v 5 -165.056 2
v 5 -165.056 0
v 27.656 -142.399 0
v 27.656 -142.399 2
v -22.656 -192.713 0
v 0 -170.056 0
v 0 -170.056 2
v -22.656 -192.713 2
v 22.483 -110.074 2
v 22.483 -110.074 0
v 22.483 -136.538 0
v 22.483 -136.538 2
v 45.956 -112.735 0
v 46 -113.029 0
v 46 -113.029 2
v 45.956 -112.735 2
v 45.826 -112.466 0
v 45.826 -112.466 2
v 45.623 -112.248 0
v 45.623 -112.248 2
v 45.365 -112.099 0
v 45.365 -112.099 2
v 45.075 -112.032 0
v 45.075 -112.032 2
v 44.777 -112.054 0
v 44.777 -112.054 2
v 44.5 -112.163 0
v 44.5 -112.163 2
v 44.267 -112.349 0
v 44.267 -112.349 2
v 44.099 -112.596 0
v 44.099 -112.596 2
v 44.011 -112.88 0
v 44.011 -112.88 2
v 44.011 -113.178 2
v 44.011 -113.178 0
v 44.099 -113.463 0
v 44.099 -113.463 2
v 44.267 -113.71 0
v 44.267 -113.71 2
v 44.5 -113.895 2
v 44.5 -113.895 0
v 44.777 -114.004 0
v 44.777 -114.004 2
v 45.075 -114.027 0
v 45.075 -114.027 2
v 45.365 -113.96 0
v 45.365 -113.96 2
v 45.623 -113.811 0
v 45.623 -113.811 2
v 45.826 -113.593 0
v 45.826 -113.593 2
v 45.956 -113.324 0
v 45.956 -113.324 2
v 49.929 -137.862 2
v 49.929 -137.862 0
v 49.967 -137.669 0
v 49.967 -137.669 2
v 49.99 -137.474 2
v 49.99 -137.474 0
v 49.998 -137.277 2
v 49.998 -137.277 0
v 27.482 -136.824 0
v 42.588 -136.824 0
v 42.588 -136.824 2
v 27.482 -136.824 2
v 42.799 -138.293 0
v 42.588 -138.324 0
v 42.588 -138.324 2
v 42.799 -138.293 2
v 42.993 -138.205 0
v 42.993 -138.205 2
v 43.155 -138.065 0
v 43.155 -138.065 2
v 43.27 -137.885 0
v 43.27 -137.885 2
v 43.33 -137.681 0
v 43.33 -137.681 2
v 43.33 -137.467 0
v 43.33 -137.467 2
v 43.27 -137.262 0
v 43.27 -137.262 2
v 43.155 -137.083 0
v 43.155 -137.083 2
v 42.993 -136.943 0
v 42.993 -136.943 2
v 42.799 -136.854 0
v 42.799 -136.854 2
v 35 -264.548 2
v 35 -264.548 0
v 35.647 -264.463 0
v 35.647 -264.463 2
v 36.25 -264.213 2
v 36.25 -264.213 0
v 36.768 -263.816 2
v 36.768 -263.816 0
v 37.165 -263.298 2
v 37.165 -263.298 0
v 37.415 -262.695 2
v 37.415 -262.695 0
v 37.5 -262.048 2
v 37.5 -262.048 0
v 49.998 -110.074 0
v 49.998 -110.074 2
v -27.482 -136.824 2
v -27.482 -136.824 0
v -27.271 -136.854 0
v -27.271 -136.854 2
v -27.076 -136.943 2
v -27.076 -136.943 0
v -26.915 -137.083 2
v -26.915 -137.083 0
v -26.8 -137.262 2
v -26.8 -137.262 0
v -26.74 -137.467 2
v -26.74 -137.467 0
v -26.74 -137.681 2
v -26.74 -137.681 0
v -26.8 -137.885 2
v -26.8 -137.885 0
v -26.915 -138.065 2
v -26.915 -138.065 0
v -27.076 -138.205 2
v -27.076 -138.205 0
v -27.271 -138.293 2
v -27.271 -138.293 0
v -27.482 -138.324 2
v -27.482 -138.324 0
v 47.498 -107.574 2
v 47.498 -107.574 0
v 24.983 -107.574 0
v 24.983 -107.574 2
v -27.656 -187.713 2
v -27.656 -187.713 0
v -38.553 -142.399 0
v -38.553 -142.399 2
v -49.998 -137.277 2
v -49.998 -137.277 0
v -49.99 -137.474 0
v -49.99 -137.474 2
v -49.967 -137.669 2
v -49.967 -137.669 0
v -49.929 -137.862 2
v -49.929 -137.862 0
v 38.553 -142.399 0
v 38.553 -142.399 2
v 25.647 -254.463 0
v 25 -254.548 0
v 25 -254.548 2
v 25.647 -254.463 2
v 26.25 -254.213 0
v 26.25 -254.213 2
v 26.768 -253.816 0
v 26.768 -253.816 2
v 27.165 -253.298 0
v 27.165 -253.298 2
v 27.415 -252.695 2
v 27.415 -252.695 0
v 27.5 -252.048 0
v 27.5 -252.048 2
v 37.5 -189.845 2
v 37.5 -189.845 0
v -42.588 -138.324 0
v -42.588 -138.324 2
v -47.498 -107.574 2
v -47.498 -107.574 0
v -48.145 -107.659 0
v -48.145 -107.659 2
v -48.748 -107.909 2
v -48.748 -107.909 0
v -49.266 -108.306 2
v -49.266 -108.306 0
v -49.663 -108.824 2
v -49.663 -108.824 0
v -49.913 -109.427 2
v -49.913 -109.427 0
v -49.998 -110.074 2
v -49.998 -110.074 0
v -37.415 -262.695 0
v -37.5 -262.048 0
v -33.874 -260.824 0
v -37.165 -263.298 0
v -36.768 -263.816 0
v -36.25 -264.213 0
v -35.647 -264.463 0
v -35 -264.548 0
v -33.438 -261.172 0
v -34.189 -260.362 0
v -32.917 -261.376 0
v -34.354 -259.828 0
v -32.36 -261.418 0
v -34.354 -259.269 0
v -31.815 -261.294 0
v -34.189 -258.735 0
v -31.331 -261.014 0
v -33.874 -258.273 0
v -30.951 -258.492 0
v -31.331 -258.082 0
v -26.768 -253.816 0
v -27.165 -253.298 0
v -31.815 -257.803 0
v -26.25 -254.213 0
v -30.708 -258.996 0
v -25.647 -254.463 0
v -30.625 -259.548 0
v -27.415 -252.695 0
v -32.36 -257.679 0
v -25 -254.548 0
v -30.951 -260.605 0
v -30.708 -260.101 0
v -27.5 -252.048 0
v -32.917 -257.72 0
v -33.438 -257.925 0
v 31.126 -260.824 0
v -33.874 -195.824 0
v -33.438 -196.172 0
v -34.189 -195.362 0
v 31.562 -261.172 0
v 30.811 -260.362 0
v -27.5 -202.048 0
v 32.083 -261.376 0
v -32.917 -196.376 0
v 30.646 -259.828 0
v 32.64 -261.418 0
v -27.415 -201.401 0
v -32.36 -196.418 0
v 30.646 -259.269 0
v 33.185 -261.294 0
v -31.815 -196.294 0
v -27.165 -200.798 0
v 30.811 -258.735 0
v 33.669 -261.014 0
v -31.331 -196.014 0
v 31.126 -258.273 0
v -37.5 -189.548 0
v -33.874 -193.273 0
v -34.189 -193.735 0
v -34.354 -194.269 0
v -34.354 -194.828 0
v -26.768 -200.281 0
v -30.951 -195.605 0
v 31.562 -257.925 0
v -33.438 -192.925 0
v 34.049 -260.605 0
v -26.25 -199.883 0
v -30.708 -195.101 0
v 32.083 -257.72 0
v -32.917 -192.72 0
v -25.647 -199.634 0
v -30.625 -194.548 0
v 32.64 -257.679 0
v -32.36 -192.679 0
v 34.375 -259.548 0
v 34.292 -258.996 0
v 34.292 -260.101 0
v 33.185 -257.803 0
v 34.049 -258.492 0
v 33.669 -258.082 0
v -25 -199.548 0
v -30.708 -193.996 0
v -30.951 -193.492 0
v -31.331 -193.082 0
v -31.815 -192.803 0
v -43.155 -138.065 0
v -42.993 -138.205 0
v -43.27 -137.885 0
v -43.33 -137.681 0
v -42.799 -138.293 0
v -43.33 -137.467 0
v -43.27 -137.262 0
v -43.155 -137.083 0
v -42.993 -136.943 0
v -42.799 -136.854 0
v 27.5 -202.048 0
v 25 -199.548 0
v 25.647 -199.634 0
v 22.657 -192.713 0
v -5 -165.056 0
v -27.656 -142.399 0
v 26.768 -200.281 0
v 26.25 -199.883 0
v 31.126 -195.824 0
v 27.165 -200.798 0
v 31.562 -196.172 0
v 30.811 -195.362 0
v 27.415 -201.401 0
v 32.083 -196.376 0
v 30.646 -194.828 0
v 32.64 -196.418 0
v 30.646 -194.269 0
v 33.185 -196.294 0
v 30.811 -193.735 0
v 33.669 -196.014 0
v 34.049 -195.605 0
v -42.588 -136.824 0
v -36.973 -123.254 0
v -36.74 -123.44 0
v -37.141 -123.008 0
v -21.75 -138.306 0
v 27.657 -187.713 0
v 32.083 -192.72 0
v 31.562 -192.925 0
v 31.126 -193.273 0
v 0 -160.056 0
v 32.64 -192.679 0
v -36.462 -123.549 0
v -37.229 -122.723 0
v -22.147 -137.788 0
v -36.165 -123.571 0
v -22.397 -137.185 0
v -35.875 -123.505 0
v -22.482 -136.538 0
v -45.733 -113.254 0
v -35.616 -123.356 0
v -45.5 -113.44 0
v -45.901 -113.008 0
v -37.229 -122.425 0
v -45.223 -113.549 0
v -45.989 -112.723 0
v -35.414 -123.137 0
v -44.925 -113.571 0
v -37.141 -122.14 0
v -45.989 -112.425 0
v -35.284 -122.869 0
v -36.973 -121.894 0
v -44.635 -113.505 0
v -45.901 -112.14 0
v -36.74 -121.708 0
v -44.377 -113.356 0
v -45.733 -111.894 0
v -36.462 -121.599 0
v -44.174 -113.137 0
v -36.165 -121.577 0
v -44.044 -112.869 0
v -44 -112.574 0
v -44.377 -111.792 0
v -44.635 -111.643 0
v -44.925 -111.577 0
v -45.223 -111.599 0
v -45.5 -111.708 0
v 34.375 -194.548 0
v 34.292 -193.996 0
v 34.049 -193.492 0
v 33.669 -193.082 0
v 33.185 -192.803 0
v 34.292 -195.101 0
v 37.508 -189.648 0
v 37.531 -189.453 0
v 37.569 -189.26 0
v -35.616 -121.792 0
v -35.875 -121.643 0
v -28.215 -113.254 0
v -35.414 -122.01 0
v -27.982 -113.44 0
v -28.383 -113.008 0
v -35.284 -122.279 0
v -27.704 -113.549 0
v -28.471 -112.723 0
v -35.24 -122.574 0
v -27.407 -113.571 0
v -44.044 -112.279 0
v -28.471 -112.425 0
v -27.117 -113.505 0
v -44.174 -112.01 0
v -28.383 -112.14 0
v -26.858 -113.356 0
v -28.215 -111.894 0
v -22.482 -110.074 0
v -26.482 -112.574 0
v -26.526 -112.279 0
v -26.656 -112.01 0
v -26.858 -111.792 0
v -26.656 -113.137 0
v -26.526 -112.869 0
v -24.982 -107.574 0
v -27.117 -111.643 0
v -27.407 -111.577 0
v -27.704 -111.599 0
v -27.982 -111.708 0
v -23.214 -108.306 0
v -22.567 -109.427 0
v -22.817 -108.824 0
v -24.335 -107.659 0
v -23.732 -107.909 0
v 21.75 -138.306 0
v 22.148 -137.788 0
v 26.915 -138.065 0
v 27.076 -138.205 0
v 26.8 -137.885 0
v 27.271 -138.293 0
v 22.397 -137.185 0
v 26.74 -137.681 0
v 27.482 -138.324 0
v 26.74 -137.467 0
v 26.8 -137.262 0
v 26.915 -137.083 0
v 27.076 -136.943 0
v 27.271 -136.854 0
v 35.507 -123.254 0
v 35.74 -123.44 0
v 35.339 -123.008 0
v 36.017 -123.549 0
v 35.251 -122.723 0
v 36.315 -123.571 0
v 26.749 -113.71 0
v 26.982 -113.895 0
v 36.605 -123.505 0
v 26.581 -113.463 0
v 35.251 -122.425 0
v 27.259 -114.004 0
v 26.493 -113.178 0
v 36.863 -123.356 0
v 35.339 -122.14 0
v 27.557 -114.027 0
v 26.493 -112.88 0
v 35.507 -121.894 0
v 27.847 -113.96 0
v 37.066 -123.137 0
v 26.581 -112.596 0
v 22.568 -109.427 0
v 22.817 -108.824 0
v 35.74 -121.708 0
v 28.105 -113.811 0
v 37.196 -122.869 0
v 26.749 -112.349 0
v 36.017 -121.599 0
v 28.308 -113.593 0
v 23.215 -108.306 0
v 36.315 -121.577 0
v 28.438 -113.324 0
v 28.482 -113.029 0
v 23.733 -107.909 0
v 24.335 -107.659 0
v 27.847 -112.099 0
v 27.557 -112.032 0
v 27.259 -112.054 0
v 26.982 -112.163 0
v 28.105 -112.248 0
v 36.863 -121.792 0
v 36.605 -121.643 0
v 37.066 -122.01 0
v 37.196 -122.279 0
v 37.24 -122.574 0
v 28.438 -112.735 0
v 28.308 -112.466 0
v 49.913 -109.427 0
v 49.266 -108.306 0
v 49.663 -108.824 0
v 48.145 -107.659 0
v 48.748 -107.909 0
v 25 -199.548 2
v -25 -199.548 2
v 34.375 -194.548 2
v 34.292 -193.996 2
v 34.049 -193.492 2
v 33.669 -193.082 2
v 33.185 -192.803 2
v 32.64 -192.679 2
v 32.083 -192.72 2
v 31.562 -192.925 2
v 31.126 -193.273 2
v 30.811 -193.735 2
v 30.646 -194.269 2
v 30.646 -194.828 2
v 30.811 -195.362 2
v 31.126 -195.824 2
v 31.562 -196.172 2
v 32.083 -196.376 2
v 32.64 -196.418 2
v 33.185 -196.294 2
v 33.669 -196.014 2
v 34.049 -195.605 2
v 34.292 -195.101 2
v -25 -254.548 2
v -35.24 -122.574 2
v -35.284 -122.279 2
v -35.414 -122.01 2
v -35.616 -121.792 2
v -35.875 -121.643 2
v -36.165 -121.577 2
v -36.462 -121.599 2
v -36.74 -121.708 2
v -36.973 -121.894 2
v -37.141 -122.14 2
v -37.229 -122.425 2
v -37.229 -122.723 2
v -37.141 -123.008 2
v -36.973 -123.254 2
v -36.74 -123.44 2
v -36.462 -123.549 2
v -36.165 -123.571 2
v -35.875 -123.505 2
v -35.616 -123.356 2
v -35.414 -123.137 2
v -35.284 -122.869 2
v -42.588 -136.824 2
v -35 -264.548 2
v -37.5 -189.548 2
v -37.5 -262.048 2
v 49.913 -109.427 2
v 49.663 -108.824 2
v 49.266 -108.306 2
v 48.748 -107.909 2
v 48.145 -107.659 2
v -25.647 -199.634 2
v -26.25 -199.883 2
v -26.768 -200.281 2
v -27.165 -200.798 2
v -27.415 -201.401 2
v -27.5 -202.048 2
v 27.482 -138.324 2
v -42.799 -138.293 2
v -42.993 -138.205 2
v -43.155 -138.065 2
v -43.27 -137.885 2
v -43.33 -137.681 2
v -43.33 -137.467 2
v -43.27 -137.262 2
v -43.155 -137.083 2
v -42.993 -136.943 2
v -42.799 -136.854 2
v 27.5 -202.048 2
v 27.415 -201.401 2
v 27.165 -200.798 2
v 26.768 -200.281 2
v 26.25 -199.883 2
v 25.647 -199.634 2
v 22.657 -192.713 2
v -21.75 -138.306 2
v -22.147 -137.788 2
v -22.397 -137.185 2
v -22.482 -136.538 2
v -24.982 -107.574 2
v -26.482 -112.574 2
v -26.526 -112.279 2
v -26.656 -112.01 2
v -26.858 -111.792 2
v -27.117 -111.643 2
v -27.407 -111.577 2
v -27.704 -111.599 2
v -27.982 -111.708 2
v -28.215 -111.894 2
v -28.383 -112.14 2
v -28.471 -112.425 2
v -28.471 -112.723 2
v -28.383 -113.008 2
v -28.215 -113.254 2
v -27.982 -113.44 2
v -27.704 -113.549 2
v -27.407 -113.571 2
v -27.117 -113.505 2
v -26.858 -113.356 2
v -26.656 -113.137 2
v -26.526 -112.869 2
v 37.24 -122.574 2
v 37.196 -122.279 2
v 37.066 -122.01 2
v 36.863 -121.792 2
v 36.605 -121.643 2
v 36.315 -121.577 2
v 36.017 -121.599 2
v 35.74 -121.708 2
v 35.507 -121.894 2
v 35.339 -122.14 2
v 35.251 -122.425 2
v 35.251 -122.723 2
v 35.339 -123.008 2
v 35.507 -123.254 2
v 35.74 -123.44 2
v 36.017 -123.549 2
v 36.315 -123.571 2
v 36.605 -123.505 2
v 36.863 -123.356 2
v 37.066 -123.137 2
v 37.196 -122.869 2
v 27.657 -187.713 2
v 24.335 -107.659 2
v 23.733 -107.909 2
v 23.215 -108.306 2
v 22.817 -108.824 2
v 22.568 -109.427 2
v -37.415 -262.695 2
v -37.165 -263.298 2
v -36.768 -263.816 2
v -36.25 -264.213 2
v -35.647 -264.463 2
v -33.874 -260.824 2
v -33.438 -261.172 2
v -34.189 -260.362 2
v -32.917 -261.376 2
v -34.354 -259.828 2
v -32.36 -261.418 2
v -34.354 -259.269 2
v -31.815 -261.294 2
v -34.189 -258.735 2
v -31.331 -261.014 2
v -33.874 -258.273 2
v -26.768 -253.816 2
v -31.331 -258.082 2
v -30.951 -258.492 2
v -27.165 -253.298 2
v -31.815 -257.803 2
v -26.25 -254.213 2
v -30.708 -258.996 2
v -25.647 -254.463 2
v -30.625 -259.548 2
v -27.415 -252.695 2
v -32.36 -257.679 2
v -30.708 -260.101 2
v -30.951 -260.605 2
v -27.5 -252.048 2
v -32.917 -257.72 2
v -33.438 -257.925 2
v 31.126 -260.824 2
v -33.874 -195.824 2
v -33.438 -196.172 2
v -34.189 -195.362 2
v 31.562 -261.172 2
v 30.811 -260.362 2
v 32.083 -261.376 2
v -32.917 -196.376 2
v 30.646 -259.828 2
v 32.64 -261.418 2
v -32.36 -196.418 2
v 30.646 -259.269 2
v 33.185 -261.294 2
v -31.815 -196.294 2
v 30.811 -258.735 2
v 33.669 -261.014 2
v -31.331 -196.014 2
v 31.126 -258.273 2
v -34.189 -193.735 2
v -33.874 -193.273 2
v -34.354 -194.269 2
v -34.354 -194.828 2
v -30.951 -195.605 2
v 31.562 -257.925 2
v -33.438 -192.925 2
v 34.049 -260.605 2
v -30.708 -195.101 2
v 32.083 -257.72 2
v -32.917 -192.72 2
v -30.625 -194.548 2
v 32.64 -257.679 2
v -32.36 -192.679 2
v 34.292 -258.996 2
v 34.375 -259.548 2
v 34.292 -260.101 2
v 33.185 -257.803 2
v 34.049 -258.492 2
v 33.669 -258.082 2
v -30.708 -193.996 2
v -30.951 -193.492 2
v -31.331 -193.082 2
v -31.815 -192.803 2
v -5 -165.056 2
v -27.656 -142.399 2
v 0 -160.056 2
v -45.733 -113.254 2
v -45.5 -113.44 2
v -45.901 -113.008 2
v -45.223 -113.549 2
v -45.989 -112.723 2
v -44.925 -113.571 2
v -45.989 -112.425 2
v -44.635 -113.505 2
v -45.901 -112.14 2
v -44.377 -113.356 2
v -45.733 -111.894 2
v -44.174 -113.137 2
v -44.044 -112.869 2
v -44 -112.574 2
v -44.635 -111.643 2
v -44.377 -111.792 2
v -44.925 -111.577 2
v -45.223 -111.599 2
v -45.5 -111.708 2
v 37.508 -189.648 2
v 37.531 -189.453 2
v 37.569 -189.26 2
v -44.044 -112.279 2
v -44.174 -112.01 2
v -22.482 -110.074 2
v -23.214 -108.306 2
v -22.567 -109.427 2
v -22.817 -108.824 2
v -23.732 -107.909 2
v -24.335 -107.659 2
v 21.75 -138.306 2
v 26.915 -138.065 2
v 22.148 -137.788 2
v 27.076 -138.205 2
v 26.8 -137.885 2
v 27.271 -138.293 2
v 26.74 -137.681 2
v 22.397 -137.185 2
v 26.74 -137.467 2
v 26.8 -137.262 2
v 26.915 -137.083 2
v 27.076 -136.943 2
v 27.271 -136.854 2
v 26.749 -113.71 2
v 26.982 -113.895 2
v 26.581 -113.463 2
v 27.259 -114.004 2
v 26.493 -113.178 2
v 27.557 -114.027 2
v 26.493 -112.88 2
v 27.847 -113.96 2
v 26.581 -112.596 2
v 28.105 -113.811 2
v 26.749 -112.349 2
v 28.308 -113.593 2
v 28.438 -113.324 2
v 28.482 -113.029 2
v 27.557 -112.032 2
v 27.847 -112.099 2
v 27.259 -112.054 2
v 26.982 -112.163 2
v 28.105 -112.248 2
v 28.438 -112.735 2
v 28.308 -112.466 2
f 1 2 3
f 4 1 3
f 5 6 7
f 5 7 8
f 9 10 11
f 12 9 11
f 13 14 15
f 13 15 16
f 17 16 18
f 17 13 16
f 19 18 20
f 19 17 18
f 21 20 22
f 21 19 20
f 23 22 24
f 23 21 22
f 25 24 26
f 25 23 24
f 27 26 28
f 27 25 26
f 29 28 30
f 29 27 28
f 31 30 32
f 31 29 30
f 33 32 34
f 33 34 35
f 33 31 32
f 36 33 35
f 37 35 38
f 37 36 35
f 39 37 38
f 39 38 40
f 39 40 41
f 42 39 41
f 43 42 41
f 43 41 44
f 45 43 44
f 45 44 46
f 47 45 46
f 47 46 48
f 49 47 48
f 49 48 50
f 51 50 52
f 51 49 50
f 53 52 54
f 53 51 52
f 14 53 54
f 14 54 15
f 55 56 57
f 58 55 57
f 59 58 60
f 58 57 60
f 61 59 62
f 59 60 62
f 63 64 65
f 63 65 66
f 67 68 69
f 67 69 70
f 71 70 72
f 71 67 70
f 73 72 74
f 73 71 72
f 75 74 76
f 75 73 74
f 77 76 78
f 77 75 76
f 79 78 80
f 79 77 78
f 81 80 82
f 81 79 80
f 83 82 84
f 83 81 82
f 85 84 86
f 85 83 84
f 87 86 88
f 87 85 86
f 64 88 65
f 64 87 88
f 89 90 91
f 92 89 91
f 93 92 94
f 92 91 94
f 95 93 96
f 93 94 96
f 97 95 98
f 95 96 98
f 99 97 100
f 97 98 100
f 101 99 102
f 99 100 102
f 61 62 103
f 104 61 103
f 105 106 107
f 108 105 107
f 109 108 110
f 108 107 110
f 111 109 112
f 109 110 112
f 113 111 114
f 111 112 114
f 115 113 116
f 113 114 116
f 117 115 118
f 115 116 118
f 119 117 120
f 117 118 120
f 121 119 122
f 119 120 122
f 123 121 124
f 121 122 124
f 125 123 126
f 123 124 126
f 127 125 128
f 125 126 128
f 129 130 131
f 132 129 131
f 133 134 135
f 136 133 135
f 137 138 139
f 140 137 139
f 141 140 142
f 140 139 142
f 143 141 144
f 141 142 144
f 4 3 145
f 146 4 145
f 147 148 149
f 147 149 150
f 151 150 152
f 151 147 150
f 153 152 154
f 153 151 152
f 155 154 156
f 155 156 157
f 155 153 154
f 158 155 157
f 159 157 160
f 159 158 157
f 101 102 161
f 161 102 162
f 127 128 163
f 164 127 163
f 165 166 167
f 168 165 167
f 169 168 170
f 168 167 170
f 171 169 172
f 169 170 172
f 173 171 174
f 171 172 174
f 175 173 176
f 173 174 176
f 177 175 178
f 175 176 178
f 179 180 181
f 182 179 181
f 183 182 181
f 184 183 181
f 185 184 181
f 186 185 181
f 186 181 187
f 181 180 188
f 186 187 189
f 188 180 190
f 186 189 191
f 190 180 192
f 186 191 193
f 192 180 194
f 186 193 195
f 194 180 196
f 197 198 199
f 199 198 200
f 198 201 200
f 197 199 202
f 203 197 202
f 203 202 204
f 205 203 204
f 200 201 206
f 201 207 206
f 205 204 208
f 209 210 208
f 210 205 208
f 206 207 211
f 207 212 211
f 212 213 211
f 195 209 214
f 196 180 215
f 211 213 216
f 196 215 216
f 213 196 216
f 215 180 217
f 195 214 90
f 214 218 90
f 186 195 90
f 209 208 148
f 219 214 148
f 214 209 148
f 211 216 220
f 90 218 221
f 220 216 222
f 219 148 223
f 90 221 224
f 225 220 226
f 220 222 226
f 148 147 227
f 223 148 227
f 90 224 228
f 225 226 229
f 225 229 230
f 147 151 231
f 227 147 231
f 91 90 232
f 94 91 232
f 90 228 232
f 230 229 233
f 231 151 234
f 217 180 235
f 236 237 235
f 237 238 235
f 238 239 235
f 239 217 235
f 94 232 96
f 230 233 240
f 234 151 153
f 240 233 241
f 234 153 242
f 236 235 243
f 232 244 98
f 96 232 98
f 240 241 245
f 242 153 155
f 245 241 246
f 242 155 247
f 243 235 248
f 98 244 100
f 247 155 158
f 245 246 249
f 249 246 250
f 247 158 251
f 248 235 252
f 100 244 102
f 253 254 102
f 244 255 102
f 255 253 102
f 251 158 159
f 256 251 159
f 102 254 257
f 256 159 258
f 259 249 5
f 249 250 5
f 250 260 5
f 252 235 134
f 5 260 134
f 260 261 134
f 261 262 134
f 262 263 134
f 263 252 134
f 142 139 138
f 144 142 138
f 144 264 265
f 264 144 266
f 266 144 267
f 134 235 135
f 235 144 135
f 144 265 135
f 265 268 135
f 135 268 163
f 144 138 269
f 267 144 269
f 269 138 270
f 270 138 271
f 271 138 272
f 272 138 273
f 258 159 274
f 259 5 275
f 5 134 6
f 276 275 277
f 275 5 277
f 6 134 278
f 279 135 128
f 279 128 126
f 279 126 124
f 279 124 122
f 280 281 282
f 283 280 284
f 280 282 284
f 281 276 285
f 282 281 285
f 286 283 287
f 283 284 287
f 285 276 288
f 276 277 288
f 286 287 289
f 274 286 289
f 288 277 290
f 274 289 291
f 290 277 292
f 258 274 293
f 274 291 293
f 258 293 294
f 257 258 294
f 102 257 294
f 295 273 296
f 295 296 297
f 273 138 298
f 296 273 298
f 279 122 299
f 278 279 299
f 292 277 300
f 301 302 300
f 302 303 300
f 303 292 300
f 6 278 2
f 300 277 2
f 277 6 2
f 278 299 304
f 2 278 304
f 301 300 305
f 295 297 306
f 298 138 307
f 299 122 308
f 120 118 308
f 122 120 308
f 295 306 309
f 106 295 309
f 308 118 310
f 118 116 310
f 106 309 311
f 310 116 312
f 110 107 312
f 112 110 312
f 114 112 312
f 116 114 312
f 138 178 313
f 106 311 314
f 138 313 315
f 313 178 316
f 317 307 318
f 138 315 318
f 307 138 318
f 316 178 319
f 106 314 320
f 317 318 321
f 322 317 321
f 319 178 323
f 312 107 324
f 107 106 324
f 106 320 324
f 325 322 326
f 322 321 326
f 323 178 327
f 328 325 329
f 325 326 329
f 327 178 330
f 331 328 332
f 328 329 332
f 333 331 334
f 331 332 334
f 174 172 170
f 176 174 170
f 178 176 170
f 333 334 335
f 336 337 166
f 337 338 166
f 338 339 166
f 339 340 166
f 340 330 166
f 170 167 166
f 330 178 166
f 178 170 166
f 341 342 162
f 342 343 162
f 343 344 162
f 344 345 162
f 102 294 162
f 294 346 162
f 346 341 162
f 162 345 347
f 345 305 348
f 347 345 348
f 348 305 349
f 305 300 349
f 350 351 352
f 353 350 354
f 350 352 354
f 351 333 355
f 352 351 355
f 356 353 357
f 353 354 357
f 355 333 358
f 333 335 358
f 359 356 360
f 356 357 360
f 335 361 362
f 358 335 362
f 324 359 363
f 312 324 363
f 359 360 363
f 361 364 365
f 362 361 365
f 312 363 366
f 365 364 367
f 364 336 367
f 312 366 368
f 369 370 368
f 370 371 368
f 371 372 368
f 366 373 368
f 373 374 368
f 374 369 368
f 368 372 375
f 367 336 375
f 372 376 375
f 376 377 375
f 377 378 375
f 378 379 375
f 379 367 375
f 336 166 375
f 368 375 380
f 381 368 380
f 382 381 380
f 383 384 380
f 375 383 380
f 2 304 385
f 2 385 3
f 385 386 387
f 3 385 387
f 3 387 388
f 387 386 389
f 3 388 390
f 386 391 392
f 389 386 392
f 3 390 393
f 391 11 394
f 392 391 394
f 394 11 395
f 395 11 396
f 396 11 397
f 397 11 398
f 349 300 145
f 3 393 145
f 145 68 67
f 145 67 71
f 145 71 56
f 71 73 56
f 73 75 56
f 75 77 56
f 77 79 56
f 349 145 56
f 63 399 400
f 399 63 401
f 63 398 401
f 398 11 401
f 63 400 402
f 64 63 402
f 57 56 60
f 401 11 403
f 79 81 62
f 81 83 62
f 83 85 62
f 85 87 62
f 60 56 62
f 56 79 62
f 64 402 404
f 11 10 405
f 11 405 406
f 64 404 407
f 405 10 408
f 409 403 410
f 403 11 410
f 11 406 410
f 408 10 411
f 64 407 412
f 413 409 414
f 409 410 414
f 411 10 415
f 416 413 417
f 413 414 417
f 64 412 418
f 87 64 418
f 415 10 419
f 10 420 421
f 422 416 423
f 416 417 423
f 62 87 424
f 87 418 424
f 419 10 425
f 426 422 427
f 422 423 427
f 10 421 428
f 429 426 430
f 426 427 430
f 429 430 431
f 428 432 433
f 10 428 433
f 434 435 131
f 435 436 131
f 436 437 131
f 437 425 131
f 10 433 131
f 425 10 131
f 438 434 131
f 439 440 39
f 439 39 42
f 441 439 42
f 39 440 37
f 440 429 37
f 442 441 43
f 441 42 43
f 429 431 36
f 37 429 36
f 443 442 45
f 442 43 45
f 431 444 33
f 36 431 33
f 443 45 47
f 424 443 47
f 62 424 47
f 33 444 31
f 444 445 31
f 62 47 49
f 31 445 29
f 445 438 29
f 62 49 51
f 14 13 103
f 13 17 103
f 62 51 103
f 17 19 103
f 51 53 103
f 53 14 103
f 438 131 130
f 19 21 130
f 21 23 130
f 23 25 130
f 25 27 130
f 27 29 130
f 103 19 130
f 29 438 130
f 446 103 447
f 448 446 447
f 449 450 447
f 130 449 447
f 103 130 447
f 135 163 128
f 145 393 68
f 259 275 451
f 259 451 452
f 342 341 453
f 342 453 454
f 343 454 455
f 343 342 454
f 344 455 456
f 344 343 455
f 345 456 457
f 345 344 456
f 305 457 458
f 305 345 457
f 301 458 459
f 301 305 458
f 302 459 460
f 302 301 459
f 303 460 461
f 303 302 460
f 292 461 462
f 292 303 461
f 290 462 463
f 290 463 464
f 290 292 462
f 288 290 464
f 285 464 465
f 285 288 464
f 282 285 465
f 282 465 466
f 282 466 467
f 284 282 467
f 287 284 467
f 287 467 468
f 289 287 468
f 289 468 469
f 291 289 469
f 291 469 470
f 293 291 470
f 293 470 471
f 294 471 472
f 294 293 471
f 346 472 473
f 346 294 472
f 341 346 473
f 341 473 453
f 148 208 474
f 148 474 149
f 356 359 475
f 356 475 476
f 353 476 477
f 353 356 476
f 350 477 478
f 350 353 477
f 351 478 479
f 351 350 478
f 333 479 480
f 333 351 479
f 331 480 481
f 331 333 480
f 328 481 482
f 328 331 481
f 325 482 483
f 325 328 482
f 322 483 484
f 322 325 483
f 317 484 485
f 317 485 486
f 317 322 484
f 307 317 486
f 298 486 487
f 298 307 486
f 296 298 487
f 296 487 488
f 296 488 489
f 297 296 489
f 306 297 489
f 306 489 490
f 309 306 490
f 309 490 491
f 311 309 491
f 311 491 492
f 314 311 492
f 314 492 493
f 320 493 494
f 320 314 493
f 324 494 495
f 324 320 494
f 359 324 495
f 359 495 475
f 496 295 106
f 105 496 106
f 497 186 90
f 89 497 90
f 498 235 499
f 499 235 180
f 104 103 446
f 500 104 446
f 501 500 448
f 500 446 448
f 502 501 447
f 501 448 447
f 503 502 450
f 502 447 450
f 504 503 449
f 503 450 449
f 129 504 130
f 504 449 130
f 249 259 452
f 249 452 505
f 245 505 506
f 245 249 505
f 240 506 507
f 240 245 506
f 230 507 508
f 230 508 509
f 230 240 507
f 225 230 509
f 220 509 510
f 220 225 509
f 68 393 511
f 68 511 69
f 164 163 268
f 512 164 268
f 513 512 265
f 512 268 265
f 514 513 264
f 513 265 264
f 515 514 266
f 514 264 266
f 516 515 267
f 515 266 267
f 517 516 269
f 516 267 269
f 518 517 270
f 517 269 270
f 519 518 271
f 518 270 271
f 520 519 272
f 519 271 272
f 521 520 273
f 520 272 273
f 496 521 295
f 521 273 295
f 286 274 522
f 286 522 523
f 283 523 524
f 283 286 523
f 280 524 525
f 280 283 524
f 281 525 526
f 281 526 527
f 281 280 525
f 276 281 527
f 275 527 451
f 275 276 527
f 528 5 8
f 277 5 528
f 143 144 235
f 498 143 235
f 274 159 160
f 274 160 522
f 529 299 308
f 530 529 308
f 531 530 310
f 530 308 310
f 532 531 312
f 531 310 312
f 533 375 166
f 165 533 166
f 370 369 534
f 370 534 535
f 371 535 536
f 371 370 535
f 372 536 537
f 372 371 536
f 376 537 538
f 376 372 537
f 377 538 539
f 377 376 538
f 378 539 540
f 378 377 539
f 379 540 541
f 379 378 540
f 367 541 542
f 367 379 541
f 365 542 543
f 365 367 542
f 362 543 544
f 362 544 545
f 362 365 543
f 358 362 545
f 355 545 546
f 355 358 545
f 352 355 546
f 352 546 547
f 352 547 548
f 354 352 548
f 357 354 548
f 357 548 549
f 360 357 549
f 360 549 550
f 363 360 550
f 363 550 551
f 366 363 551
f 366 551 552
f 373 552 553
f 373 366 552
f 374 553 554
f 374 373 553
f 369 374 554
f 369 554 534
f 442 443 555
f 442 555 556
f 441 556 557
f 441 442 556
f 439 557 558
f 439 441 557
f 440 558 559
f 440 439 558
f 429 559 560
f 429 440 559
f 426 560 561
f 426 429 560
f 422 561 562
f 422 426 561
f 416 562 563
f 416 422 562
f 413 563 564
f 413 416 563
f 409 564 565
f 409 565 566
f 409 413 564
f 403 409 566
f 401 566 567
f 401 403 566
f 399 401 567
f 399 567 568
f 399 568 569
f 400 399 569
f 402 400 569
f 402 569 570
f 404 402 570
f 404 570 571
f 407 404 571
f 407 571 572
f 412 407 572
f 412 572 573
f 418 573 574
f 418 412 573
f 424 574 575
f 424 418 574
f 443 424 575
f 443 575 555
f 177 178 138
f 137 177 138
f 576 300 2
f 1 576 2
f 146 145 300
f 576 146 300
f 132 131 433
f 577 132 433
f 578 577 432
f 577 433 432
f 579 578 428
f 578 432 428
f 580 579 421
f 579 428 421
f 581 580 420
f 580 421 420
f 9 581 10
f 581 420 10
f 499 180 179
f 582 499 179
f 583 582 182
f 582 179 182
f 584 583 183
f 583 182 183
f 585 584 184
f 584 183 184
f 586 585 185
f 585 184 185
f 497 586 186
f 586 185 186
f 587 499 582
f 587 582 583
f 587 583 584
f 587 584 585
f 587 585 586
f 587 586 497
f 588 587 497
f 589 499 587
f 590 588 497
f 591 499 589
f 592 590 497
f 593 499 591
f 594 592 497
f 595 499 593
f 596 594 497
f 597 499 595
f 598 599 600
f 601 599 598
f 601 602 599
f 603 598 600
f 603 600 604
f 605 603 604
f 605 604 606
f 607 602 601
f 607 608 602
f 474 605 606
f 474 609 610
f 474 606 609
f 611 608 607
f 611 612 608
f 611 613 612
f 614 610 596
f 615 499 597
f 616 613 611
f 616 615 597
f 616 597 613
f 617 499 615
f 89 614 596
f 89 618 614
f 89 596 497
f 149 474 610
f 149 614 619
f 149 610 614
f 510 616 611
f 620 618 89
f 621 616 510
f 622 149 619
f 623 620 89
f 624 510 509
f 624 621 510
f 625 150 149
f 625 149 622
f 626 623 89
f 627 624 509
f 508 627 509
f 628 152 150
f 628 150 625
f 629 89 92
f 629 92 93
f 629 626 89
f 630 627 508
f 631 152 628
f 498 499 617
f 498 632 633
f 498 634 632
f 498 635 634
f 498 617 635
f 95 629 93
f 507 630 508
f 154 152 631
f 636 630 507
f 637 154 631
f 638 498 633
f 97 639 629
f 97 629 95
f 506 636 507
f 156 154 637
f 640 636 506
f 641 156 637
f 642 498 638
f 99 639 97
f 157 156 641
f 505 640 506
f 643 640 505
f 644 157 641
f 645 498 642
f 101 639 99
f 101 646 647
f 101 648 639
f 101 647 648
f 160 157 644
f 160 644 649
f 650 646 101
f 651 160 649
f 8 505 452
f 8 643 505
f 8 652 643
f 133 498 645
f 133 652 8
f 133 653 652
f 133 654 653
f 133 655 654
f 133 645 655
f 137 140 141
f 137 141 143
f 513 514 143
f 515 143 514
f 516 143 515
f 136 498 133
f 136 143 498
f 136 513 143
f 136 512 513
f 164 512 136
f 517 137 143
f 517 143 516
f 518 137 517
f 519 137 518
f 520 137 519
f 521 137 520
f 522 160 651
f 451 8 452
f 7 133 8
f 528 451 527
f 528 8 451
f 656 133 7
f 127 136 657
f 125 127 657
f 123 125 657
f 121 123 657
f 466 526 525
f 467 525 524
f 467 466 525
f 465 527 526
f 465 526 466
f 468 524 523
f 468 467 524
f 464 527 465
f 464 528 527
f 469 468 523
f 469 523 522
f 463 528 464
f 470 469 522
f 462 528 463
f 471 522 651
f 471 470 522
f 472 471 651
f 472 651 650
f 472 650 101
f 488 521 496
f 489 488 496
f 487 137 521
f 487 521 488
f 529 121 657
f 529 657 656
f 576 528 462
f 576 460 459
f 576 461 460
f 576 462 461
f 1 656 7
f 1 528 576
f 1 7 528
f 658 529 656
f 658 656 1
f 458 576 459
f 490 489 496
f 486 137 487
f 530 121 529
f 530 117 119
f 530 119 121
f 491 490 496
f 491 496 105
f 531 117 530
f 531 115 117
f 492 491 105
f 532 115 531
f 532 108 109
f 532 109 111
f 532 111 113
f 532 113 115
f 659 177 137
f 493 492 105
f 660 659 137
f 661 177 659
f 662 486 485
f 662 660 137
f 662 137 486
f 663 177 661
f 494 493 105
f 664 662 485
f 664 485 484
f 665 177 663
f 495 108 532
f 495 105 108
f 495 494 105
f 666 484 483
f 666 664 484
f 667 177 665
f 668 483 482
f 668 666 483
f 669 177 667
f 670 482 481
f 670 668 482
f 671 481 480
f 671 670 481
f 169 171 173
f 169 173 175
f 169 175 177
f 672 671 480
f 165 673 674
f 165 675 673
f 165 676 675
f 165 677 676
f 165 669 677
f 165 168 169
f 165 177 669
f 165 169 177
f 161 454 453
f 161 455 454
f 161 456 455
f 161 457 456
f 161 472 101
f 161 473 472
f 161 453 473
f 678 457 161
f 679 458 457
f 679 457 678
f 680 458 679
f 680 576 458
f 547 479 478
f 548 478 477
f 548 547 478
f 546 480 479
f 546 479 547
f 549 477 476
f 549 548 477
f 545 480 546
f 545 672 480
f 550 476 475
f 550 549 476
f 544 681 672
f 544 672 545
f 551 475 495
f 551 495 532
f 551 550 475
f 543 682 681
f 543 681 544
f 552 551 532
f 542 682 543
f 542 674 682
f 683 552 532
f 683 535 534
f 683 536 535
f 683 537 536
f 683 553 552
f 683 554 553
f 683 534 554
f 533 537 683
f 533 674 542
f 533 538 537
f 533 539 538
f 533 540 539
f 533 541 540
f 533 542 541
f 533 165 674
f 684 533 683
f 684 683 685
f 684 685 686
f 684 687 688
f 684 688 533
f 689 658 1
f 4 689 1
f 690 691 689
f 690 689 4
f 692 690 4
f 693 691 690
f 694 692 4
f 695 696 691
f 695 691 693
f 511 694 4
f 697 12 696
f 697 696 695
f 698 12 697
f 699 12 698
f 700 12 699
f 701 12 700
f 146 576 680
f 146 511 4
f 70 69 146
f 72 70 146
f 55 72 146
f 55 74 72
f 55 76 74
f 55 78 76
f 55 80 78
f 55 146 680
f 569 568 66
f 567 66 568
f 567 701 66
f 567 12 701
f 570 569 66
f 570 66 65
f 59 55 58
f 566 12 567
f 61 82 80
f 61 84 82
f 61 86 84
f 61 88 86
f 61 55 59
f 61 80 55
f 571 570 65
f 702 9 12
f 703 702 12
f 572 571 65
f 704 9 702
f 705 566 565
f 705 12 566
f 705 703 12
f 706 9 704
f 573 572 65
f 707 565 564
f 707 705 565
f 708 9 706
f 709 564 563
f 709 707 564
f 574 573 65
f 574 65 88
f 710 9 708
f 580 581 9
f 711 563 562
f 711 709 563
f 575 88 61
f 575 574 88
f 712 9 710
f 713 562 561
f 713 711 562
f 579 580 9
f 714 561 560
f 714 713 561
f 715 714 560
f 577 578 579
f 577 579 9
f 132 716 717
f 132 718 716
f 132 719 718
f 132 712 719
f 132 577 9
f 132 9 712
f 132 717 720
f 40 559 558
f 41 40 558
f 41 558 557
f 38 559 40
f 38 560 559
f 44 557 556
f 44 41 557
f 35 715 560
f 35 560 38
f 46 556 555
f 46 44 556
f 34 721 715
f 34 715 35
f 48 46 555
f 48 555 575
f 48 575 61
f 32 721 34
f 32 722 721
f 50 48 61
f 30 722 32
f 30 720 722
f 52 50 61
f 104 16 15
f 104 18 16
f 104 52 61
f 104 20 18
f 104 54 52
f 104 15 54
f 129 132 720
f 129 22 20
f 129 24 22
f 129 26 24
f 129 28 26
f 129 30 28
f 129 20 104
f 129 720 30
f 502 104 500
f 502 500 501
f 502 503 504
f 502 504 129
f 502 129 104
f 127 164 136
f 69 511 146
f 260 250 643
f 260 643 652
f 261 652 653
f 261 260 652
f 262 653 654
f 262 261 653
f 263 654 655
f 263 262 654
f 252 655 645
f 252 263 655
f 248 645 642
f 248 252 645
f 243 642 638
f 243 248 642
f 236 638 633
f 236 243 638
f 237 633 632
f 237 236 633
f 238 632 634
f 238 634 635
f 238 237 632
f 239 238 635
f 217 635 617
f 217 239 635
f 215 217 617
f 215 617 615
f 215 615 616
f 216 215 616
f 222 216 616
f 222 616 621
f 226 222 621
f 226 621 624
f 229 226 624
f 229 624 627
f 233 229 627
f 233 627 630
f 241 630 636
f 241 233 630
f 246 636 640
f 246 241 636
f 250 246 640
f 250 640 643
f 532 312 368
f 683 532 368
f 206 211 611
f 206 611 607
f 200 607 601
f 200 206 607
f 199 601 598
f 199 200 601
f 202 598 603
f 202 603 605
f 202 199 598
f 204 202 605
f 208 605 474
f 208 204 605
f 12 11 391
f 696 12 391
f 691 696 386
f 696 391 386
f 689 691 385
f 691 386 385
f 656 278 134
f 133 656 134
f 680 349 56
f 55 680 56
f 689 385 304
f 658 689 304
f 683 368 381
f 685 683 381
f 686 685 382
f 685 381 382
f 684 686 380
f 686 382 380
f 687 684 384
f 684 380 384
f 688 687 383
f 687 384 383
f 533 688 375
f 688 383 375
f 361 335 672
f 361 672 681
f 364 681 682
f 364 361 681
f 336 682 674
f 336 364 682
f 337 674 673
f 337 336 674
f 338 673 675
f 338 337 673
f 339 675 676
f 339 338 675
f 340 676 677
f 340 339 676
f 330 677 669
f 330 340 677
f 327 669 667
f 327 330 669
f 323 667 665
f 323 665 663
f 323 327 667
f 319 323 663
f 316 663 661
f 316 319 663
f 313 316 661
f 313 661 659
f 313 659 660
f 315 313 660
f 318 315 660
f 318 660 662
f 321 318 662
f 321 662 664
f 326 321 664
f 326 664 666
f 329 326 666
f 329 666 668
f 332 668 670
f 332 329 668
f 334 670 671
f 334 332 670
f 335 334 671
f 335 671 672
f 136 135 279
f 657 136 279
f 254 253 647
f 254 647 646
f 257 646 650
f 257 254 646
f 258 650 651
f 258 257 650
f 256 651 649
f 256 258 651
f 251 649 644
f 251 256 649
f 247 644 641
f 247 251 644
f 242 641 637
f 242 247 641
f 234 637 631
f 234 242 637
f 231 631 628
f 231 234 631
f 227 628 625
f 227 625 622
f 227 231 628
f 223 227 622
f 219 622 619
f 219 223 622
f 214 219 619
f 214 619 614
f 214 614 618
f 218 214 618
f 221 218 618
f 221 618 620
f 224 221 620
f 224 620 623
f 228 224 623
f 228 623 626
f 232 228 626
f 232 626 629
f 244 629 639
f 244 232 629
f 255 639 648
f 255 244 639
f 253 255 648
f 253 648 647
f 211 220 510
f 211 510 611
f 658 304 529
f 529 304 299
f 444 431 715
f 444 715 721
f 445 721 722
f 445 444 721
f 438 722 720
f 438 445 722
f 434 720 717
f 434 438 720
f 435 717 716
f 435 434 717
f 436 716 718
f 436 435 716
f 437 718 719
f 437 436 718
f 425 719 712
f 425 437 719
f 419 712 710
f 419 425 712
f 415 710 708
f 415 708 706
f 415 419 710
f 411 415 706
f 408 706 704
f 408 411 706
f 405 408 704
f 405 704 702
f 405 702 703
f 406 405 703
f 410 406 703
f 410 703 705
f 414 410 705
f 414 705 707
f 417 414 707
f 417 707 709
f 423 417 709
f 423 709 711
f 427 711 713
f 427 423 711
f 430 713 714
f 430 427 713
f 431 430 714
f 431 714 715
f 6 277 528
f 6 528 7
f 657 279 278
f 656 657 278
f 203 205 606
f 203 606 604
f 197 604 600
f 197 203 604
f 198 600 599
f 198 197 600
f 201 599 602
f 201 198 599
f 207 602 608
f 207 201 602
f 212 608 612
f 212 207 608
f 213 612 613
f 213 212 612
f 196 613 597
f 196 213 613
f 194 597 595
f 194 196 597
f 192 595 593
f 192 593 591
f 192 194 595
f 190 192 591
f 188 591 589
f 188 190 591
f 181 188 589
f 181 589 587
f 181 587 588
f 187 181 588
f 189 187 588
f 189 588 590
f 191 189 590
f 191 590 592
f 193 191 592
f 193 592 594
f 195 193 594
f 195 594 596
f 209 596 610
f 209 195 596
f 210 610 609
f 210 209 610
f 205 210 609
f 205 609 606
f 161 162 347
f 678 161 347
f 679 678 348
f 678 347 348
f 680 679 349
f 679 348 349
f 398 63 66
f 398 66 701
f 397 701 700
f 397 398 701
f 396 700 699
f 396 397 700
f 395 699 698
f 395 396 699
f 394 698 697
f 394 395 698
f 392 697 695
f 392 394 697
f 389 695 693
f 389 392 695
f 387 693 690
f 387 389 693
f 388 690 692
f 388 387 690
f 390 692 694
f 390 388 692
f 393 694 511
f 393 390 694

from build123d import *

# Parameters (mm, degrees)
SKETCH1_R           = 1.875
SKETCH1_R_2         = 1
BOSS_EXTRUDE2_DEPTH = 2


with BuildPart() as part:
    # Sketch1 → Boss-Extrude2 (new body)
    with BuildSketch(Plane.XY):
        with BuildLine():
            Line((-35, -264.548366883), (35, -264.548366883))
            ThreePointArc((35, -264.548366883), (36.767766953, -263.816133836), (37.5, -262.048366883))
            Line((37.5, -262.048366883), (37.5, -189.844720828))
            ThreePointArc((37.5, -189.844720828), (37.517382153, -189.550427391), (37.569286901, -189.260226318))
            Line((37.569286901, -189.260226318), (49.928636869, -137.861909768))
            ThreePointArc((49.928636869, -137.861909768), (49.980541617, -137.571708695), (49.99792377, -137.277415258))
            Line((49.99792377, -137.277415258), (49.99792377, -110.073769203))
            ThreePointArc((49.99792377, -110.073769203), (49.265690723, -108.30600225), (47.49792377, -107.573769203))
            Line((47.49792377, -107.573769203), (24.98250936, -107.573769203))
            ThreePointArc((24.98250936, -107.573769203), (23.214742407, -108.30600225), (22.48250936, -110.073769203))
            Line((22.48250936, -110.073769203), (22.48250936, -136.538235297))
            ThreePointArc((22.48250936, -136.538235297), (22.292208191, -137.494943878), (21.750276313, -138.30600225))
            Line((21.750276313, -138.30600225), (0.000286917, -160.055991645))
            Line((0.000286917, -160.055991645), (-21.749702478, -138.30600225))
            ThreePointArc((-21.749702478, -138.30600225), (-22.291634357, -137.494943878), (-22.481935525, -136.538235297))
            Line((-22.481935525, -136.538235297), (-22.481935525, -110.073769203))
            ThreePointArc((-22.481935525, -110.073769203), (-23.214168572, -108.30600225), (-24.981935525, -107.573769203))
            Line((-24.981935525, -107.573769203), (-47.49792377, -107.573769203))
            ThreePointArc((-47.49792377, -107.573769203), (-49.265690723, -108.30600225), (-49.99792377, -110.073769203))
            Line((-49.99792377, -110.073769203), (-49.99792377, -137.277415258))
            ThreePointArc((-49.99792377, -137.277415258), (-49.980541617, -137.571708695), (-49.928636869, -137.861909768))
            Line((-49.928636869, -137.861909768), (-37.5, -189.548366883))
            Line((-37.5, -189.548366883), (-37.5, -262.048366883))
            ThreePointArc((-37.5, -262.048366883), (-36.767766953, -263.816133836), (-35, -264.548366883))
        make_face()
        with Locations((32.5, -259.548366883)):
            Circle(SKETCH1_R, mode=Mode.SUBTRACT)
        with Locations((-32.5, -259.548366883)):
            Circle(SKETCH1_R, mode=Mode.SUBTRACT)
        with Locations((-32.5, -194.548366883)):
            Circle(SKETCH1_R, mode=Mode.SUBTRACT)
        with Locations((32.5, -194.548366883)):
            Circle(SKETCH1_R, mode=Mode.SUBTRACT)
        with Locations((-45, -112.573769203)):
            Circle(SKETCH1_R_2, mode=Mode.SUBTRACT)
        with Locations((-27.481935525, -112.573769203)):
            Circle(SKETCH1_R_2, mode=Mode.SUBTRACT)
        with Locations((27.481935525, -113.029421113)):
            Circle(SKETCH1_R_2, mode=Mode.SUBTRACT)
        with Locations((45, -113.029421113)):
            Circle(SKETCH1_R_2, mode=Mode.SUBTRACT)
        with Locations((-36.239929648, -122.573769203)):
            Circle(SKETCH1_R_2, mode=Mode.SUBTRACT)
        with Locations((36.239929648, -122.573769203)):
            Circle(SKETCH1_R_2, mode=Mode.SUBTRACT)
        Polygon((-27.65637254, -187.712651103), (-38.552510863, -142.399332188), (-27.65637254, -142.399332188), (-4.999713083, -165.055991645), align=None, mode=Mode.SUBTRACT)
        Polygon((38.552510863, -142.399332188), (27.656946375, -187.712651103), (5.000286917, -165.055991645), (27.65637254, -142.399332188), align=None, mode=Mode.SUBTRACT)
        with BuildLine():
            Line((-27.5, -204.548366883), (-27.5, -249.548366883))
            Line((-27.5, -249.548366883), (-27.5, -252.048366883))
            ThreePointArc((-27.5, -252.048366883), (-26.767766953, -253.816133836), (-25, -254.548366883))
            Line((-25, -254.548366883), (-16.464466094, -254.548366883))
            Line((-16.464466094, -254.548366883), (16.464466094, -254.548366883))
            Line((16.464466094, -254.548366883), (25, -254.548366883))
            ThreePointArc((25, -254.548366883), (26.767766953, -253.816133836), (27.5, -252.048366883))
            Line((27.5, -252.048366883), (27.5, -249.548366883))
            Line((27.5, -249.548366883), (27.5, -204.548366883))
            Line((27.5, -204.548366883), (27.5, -202.048366883))
            ThreePointArc((27.5, -202.048366883), (26.767766953, -200.28059993), (25, -199.548366883))
            Line((25, -199.548366883), (22.5, -199.548366883))
            Line((22.5, -199.548366883), (-22.5, -199.548366883))
            Line((-22.5, -199.548366883), (-25, -199.548366883))
            ThreePointArc((-25, -199.548366883), (-26.767766953, -200.28059993), (-27.5, -202.048366883))
            Line((-27.5, -202.048366883), (-27.5, -204.548366883))
        make_face(mode=Mode.SUBTRACT)
        Polygon((-22.65637254, -192.712651103), (22.656946375, -192.712651103), (0.000286917, -170.055991645), align=None, mode=Mode.SUBTRACT)
        with BuildLine():
            Line((-42.587811549, -136.823769203), (-27.481935525, -136.823769203))
            ThreePointArc((-27.481935525, -136.823769203), (-26.731935525, -137.573769203), (-27.481935525, -138.323769203))
            Line((-27.481935525, -138.323769203), (-42.587811549, -138.323769203))
            ThreePointArc((-42.587811549, -138.323769203), (-43.337811549, -137.573769203), (-42.587811549, -136.823769203))
        make_face(mode=Mode.SUBTRACT)
        with BuildLine():
            Line((42.587811549, -136.823769203), (27.481935525, -136.823769203))
            ThreePointArc((27.481935525, -136.823769203), (26.731935525, -137.573769203), (27.481935525, -138.323769203))
            Line((27.481935525, -138.323769203), (42.587811549, -138.323769203))
            ThreePointArc((42.587811549, -138.323769203), (43.337811549, -137.573769203), (42.587811549, -136.823769203))
        make_face(mode=Mode.SUBTRACT)
    extrude(amount=BOSS_EXTRUDE2_DEPTH)


solid = part.part
